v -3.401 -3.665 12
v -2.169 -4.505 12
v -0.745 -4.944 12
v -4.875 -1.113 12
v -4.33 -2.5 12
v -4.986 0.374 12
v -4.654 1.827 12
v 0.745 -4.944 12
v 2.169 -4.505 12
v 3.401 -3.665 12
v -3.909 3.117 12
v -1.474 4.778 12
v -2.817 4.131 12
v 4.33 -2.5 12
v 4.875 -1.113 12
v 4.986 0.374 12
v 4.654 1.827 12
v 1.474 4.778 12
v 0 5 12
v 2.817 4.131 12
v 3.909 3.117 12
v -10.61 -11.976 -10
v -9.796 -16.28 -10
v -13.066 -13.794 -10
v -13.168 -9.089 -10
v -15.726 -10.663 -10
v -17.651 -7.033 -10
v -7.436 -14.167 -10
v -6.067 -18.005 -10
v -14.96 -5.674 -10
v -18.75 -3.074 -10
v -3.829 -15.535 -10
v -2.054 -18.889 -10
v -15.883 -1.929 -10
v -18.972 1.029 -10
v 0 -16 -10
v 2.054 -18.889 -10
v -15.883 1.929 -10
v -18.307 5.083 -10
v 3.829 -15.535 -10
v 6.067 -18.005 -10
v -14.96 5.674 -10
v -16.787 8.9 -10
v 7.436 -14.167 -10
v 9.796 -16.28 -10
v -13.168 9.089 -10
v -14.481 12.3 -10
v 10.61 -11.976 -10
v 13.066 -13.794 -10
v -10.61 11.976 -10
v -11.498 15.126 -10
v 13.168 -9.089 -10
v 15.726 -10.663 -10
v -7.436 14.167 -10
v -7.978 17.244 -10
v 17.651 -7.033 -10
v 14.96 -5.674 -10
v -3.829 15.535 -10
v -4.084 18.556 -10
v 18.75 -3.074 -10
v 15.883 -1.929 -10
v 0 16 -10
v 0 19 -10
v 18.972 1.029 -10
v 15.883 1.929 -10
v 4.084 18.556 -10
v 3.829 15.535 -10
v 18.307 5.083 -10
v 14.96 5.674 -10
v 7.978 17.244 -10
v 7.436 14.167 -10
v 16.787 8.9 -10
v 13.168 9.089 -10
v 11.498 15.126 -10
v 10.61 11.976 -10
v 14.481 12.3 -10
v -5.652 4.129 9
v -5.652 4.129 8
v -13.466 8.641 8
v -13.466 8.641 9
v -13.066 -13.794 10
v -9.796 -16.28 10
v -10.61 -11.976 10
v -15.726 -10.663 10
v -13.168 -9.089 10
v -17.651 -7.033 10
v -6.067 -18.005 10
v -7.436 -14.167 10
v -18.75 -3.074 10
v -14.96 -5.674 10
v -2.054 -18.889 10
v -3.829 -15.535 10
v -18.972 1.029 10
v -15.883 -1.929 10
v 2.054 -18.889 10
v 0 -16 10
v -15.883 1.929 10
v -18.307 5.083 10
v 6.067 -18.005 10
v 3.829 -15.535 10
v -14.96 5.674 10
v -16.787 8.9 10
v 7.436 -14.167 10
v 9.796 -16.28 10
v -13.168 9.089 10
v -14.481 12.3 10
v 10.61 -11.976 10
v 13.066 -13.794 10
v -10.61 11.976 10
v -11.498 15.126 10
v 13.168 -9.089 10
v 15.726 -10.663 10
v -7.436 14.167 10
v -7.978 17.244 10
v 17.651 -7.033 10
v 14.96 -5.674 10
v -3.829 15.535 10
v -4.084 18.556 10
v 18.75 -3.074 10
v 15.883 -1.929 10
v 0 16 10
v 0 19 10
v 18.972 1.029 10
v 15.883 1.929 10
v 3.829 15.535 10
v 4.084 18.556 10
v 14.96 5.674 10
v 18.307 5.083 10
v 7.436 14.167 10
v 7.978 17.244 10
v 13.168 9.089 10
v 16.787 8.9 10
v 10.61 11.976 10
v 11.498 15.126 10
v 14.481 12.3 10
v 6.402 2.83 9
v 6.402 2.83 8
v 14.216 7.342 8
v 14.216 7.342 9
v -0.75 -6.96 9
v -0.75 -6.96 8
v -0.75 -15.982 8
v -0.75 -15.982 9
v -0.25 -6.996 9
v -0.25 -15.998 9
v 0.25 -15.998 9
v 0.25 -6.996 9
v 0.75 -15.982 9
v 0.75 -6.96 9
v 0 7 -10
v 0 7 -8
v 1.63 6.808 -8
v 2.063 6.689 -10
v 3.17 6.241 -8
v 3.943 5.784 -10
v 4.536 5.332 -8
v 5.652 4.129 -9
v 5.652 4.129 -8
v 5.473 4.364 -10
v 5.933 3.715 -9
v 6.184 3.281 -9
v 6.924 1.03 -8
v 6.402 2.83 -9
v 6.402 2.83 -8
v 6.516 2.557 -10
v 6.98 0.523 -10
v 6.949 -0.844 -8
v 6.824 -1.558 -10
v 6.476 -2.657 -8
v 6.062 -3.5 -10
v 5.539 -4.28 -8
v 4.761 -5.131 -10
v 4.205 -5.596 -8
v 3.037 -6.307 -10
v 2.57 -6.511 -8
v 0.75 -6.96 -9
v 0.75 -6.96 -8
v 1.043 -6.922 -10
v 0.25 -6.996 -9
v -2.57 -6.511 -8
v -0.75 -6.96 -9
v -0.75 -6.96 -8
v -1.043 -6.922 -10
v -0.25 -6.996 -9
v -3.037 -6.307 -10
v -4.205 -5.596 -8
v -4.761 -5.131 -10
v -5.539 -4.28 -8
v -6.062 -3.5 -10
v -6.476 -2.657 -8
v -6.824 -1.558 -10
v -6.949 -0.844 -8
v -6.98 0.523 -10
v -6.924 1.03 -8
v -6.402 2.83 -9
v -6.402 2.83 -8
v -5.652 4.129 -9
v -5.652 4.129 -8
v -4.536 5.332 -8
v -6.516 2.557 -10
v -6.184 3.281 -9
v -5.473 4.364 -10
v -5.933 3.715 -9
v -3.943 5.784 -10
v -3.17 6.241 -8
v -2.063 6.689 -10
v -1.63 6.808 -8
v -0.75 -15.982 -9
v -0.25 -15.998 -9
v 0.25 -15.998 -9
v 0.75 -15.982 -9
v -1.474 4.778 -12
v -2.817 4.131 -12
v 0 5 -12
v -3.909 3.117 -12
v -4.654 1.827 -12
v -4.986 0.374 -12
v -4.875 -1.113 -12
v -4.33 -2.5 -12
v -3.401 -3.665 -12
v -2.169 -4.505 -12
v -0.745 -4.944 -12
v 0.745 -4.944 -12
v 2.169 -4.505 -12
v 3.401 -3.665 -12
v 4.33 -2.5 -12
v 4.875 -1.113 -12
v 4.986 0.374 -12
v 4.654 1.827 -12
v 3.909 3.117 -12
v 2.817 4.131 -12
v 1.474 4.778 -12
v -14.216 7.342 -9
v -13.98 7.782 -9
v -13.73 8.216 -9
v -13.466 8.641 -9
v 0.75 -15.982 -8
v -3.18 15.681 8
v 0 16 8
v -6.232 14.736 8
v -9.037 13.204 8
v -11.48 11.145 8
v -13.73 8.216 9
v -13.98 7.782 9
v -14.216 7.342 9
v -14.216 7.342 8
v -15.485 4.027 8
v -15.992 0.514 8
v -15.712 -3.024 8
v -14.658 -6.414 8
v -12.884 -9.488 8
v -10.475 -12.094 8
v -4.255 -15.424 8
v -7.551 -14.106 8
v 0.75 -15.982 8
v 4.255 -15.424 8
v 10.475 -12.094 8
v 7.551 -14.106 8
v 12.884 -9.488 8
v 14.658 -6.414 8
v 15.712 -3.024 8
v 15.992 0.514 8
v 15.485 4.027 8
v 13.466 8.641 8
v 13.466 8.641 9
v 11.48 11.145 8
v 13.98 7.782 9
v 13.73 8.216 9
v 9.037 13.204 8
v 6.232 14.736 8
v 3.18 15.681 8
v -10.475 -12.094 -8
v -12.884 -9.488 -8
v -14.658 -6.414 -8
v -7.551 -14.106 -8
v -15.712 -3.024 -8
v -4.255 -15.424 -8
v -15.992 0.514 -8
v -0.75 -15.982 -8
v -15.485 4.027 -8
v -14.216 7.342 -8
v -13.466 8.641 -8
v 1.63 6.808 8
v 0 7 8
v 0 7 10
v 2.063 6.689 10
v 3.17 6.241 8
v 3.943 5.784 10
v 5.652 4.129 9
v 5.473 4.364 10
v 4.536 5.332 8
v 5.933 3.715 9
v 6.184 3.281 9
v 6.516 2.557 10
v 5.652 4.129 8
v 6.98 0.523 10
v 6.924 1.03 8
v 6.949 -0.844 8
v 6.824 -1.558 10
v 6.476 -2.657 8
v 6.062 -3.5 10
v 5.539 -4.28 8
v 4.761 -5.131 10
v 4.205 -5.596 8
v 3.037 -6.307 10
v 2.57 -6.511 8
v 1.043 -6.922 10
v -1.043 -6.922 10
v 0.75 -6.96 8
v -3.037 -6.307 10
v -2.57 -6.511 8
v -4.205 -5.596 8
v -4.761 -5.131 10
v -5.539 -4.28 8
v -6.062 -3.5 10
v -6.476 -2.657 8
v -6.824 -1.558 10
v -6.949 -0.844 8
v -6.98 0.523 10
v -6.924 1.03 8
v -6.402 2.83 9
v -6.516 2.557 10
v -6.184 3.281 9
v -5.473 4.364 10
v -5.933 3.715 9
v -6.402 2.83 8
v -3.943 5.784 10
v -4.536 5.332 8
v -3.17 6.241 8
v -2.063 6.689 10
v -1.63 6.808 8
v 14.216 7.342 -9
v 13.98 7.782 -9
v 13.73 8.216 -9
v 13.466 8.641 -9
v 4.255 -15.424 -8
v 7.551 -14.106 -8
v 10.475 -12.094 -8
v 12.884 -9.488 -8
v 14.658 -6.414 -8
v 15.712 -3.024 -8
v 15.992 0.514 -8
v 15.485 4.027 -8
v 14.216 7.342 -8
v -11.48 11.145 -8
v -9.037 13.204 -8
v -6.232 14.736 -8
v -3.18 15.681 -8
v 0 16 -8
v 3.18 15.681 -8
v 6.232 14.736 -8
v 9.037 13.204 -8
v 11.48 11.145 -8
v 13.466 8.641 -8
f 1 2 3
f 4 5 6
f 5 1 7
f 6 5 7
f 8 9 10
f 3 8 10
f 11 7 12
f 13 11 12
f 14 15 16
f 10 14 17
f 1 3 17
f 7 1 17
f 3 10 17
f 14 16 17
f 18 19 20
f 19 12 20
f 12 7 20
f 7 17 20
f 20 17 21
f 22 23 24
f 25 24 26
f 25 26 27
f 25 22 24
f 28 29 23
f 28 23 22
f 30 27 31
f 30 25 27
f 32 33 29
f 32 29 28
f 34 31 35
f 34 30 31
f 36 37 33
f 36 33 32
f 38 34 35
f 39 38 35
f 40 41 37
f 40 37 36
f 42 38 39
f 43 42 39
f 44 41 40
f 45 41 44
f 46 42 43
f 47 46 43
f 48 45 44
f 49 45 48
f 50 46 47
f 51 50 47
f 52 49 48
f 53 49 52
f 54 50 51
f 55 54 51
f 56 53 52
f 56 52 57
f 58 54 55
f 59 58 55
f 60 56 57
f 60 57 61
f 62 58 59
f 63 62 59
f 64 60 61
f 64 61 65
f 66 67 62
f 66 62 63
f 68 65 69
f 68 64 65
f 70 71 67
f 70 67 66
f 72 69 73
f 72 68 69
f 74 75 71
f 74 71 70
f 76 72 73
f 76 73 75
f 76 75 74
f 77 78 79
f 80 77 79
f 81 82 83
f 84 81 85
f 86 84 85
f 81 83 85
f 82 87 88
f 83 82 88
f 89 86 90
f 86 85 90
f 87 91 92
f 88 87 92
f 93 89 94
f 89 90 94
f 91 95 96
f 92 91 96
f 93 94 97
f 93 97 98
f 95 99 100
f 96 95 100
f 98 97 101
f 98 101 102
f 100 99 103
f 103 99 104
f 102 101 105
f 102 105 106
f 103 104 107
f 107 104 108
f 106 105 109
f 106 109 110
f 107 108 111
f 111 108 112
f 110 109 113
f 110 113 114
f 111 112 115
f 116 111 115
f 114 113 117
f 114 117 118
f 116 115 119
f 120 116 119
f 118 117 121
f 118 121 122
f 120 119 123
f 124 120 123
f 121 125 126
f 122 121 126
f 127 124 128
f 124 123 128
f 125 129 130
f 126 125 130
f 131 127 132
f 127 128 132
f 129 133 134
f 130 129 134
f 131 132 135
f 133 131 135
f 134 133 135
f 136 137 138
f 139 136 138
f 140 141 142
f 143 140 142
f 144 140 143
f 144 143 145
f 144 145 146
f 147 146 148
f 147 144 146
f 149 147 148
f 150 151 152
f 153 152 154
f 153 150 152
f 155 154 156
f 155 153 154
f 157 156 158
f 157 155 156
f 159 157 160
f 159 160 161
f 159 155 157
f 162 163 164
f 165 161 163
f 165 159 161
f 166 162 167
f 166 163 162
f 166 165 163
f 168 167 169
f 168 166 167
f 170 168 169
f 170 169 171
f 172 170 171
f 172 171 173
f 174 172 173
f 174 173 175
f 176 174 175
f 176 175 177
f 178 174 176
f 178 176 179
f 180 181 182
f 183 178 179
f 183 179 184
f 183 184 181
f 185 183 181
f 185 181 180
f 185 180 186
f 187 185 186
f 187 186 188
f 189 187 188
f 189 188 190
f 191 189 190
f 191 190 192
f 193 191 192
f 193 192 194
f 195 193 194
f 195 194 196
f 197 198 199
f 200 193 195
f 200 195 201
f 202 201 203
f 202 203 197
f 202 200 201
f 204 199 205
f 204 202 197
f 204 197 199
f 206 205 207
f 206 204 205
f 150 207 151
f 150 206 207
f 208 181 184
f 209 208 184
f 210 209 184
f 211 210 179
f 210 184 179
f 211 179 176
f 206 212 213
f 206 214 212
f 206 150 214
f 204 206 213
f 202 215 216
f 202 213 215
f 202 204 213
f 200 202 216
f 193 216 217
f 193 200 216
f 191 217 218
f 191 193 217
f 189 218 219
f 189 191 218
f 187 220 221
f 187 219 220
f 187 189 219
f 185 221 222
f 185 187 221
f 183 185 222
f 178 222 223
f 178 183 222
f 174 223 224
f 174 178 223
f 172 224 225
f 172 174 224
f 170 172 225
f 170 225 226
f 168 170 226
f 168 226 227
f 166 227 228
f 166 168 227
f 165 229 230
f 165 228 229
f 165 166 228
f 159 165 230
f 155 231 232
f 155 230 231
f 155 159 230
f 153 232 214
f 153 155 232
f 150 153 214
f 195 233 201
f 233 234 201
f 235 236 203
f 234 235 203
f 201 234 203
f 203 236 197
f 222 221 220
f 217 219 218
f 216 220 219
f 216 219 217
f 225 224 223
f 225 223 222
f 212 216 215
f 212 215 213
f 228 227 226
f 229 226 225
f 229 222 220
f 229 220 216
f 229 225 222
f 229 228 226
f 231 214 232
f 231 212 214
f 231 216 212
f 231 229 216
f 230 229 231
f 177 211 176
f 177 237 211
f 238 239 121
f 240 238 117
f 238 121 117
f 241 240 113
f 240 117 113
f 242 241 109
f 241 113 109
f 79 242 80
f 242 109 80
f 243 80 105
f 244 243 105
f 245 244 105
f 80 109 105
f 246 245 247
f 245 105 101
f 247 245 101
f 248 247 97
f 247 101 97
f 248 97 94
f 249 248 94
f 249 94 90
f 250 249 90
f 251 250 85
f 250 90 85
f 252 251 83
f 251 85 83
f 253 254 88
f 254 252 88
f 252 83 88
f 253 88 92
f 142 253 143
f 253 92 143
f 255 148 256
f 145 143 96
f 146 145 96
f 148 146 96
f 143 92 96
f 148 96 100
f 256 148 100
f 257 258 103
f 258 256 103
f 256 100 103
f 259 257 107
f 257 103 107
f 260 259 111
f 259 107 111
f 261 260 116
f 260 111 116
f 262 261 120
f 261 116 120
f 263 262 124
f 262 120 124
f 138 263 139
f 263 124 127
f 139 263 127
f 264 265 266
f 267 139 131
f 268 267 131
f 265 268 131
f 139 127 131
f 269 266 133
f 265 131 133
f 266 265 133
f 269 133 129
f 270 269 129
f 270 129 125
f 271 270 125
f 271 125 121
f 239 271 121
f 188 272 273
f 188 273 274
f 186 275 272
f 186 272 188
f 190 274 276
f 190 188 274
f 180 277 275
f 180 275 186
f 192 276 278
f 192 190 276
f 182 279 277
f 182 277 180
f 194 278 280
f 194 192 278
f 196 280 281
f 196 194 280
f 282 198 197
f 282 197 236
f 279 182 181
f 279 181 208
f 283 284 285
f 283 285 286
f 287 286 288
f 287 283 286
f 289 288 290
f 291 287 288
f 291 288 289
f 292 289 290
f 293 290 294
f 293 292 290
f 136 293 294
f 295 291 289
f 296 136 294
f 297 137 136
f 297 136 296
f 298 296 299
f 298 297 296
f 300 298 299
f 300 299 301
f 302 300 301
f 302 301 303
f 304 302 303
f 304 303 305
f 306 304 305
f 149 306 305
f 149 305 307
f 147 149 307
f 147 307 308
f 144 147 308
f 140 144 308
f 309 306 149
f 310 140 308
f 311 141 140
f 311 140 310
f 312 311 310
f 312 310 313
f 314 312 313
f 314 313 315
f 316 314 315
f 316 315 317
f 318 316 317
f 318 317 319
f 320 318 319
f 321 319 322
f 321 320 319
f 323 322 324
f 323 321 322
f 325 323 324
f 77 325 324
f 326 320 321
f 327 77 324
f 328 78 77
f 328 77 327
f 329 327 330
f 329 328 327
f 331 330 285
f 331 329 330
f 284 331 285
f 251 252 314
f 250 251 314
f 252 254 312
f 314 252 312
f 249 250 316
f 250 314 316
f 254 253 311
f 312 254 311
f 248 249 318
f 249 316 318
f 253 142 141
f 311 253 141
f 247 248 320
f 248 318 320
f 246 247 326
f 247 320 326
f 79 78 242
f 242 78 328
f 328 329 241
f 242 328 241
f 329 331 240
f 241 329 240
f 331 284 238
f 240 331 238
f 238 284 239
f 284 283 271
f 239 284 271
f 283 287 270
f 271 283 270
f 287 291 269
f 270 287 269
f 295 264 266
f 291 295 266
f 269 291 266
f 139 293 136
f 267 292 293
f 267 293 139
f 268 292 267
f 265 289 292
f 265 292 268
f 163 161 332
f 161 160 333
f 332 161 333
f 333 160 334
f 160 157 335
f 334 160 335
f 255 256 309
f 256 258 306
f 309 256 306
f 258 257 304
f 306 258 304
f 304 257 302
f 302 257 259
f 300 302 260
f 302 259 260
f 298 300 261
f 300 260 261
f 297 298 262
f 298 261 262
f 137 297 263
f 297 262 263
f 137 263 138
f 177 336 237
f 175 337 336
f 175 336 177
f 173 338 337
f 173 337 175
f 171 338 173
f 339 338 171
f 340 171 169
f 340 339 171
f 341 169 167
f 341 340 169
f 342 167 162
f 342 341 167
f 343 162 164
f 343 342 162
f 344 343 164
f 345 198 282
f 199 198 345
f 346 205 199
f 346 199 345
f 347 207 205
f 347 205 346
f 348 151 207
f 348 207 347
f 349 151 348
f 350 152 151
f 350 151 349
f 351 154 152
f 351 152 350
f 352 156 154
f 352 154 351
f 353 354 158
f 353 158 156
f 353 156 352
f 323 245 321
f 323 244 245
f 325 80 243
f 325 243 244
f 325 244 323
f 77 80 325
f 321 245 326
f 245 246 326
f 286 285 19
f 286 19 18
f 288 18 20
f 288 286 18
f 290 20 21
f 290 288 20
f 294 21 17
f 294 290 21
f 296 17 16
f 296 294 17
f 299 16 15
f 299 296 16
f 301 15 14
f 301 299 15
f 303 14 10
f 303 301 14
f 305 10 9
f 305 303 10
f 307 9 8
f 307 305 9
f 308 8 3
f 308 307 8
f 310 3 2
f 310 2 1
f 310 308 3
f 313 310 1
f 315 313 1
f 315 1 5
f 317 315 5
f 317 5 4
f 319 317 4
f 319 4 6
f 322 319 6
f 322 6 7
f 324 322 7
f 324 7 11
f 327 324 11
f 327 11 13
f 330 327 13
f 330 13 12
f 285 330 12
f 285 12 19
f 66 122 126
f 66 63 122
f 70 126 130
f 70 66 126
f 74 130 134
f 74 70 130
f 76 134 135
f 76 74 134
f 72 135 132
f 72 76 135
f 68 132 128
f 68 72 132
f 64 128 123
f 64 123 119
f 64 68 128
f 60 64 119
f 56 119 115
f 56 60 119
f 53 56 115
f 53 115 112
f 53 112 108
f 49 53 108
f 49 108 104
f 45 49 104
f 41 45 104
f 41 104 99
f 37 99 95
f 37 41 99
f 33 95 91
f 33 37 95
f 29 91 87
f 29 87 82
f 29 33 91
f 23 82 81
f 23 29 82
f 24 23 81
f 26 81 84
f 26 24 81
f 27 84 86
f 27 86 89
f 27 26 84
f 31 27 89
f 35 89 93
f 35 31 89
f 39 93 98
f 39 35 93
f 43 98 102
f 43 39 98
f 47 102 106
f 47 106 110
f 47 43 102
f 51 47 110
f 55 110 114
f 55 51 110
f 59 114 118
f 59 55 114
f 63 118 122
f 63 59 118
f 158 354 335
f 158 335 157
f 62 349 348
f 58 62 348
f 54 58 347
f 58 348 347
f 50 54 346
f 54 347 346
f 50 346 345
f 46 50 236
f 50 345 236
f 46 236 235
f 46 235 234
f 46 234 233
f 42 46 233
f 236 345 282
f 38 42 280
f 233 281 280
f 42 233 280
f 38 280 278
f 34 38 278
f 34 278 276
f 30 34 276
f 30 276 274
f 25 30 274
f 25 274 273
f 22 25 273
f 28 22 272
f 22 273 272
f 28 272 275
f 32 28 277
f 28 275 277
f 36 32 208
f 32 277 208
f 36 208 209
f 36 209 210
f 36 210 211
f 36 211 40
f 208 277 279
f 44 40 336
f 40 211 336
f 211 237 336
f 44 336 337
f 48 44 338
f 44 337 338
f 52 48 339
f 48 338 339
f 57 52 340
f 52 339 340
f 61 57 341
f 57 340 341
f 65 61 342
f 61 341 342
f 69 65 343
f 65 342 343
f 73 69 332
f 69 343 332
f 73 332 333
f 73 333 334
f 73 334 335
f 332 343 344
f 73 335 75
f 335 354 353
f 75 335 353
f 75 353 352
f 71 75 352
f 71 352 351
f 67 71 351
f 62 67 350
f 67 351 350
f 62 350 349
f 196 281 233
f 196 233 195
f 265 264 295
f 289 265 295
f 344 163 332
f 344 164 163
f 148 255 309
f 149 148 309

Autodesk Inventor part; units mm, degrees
sketch "Sketch_1" plane through (0, 0, 0) normal (1, 0, 0) x (0, 1, 0)
  line L0 (0, -12) -> (0, 12)
  line L1 (0, 12) -> (5, 12)
  line L2 (5, 12) -> (7, 10)
  line L3 (7, 10) -> (7, 8)
  line L4 (7, 8) -> (16, 8)
  line L5 (16, 8) -> (16, 10)
  line L6 (16, 10) -> (19, 10)
  line L7 (19, 10) -> (19, -10)
  line L8 (19, -10) -> (16, -10)
  line L9 (16, -10) -> (16, -8)
  line L10 (16, -8) -> (7, -8)
  line L11 (7, -8) -> (7, -10)
  line L12 (7, -10) -> (5, -12)
  line L13 (5, -12) -> (0, -12)
  line L14 (0, -12) -> (0, 12)
revolve "Revolution1" add sketch "Sketch_1" angle 360 about axis through (0, 0, -12) along (0, 0, -1)
sketch "Sketch_3" plane through (0, 0, 8) normal (0, 0, 1) x (1, 0, 0)
  line L0 (-0.75, -17) -> (0.75, -17)
  line L1 (0.75, -17) -> (0.75, -4)
  line L2 (0.75, -4) -> (-0.75, -4)
  line L3 (-0.75, -4) -> (-0.75, -17)
extrude "Extrusion1" add sketch "Sketch_3" along normal blind 1
sketch "Sketch_2" plane through (0, 0, 8) normal (0, 0, 1) x (1, 0, 0)
  line L0 (3.0891, 2.6495) -> (3.8391, 1.3505)
  line L1 (3.8391, 1.3505) -> (15.0974, 7.8505)
  line L2 (15.0974, 7.8505) -> (14.3474, 9.1495)
  line L3 (14.3474, 9.1495) -> (3.0891, 2.6495)
extrude "Extrusion2" add sketch "Sketch_2" along normal blind 1
sketch "Sketch_4" plane through (0, 0, 8) normal (0, 0, 1) x (1, 0, 0)
  line L0 (-15.0974, 7.8505) -> (-3.8391, 1.3505)
  line L1 (-3.8391, 1.3505) -> (-3.0891, 2.6495)
  line L2 (-3.0891, 2.6495) -> (-14.3474, 9.1495)
  line L3 (-14.3474, 9.1495) -> (-15.0974, 7.8505)
extrude "Extrusion3" add sketch "Sketch_4" along normal blind 1
sketch "Sketch_5" plane through (0, 0, -8) normal (0, 0, 1) x (1, 0, 0)
  line L0 (-0.75, -17) -> (0.75, -17)
  line L1 (0.75, -17) -> (0.75, -4)
  line L2 (0.75, -4) -> (-0.75, -4)
  line L3 (-0.75, -4) -> (-0.75, -17)
extrude "Extrusion4" add sketch "Sketch_5" against normal blind 1
sketch "Sketch_6" plane through (0, 0, -8) normal (0, 0, 1) x (1, 0, 0)
  line L0 (3.0891, 2.6495) -> (3.8391, 1.3505)
  line L1 (3.8391, 1.3505) -> (15.0974, 7.8505)
  line L2 (15.0974, 7.8505) -> (14.3474, 9.1495)
  line L3 (14.3474, 9.1495) -> (3.0891, 2.6495)
extrude "Extrusion5" add sketch "Sketch_6" against normal blind 1
sketch "Sketch_7" plane through (0, 0, -8) normal (0, 0, 1) x (1, 0, 0)
  line L0 (-15.0974, 7.8505) -> (-3.8391, 1.3505)
  line L1 (-3.8391, 1.3505) -> (-3.0891, 2.6495)
  line L2 (-3.0891, 2.6495) -> (-14.3474, 9.1495)
  line L3 (-14.3474, 9.1495) -> (-15.0974, 7.8505)
extrude "Extrusion6" add sketch "Sketch_7" against normal blind 1
ref_plane "to_wheel_XY" through (0, 0, 0) normal (0, 0, 1) x (1, 0, 0)
ref_plane "to_wheel_YZ" through (0, 0, 0) normal (1, 0, 0) x (0, 1, 0)
ref_plane "to_wheel_ZX" through (0, 0, 0) normal (0, 1, 0) x (0, 0, 1)
properties part number "CHAMJ-E50-Rbearing"
